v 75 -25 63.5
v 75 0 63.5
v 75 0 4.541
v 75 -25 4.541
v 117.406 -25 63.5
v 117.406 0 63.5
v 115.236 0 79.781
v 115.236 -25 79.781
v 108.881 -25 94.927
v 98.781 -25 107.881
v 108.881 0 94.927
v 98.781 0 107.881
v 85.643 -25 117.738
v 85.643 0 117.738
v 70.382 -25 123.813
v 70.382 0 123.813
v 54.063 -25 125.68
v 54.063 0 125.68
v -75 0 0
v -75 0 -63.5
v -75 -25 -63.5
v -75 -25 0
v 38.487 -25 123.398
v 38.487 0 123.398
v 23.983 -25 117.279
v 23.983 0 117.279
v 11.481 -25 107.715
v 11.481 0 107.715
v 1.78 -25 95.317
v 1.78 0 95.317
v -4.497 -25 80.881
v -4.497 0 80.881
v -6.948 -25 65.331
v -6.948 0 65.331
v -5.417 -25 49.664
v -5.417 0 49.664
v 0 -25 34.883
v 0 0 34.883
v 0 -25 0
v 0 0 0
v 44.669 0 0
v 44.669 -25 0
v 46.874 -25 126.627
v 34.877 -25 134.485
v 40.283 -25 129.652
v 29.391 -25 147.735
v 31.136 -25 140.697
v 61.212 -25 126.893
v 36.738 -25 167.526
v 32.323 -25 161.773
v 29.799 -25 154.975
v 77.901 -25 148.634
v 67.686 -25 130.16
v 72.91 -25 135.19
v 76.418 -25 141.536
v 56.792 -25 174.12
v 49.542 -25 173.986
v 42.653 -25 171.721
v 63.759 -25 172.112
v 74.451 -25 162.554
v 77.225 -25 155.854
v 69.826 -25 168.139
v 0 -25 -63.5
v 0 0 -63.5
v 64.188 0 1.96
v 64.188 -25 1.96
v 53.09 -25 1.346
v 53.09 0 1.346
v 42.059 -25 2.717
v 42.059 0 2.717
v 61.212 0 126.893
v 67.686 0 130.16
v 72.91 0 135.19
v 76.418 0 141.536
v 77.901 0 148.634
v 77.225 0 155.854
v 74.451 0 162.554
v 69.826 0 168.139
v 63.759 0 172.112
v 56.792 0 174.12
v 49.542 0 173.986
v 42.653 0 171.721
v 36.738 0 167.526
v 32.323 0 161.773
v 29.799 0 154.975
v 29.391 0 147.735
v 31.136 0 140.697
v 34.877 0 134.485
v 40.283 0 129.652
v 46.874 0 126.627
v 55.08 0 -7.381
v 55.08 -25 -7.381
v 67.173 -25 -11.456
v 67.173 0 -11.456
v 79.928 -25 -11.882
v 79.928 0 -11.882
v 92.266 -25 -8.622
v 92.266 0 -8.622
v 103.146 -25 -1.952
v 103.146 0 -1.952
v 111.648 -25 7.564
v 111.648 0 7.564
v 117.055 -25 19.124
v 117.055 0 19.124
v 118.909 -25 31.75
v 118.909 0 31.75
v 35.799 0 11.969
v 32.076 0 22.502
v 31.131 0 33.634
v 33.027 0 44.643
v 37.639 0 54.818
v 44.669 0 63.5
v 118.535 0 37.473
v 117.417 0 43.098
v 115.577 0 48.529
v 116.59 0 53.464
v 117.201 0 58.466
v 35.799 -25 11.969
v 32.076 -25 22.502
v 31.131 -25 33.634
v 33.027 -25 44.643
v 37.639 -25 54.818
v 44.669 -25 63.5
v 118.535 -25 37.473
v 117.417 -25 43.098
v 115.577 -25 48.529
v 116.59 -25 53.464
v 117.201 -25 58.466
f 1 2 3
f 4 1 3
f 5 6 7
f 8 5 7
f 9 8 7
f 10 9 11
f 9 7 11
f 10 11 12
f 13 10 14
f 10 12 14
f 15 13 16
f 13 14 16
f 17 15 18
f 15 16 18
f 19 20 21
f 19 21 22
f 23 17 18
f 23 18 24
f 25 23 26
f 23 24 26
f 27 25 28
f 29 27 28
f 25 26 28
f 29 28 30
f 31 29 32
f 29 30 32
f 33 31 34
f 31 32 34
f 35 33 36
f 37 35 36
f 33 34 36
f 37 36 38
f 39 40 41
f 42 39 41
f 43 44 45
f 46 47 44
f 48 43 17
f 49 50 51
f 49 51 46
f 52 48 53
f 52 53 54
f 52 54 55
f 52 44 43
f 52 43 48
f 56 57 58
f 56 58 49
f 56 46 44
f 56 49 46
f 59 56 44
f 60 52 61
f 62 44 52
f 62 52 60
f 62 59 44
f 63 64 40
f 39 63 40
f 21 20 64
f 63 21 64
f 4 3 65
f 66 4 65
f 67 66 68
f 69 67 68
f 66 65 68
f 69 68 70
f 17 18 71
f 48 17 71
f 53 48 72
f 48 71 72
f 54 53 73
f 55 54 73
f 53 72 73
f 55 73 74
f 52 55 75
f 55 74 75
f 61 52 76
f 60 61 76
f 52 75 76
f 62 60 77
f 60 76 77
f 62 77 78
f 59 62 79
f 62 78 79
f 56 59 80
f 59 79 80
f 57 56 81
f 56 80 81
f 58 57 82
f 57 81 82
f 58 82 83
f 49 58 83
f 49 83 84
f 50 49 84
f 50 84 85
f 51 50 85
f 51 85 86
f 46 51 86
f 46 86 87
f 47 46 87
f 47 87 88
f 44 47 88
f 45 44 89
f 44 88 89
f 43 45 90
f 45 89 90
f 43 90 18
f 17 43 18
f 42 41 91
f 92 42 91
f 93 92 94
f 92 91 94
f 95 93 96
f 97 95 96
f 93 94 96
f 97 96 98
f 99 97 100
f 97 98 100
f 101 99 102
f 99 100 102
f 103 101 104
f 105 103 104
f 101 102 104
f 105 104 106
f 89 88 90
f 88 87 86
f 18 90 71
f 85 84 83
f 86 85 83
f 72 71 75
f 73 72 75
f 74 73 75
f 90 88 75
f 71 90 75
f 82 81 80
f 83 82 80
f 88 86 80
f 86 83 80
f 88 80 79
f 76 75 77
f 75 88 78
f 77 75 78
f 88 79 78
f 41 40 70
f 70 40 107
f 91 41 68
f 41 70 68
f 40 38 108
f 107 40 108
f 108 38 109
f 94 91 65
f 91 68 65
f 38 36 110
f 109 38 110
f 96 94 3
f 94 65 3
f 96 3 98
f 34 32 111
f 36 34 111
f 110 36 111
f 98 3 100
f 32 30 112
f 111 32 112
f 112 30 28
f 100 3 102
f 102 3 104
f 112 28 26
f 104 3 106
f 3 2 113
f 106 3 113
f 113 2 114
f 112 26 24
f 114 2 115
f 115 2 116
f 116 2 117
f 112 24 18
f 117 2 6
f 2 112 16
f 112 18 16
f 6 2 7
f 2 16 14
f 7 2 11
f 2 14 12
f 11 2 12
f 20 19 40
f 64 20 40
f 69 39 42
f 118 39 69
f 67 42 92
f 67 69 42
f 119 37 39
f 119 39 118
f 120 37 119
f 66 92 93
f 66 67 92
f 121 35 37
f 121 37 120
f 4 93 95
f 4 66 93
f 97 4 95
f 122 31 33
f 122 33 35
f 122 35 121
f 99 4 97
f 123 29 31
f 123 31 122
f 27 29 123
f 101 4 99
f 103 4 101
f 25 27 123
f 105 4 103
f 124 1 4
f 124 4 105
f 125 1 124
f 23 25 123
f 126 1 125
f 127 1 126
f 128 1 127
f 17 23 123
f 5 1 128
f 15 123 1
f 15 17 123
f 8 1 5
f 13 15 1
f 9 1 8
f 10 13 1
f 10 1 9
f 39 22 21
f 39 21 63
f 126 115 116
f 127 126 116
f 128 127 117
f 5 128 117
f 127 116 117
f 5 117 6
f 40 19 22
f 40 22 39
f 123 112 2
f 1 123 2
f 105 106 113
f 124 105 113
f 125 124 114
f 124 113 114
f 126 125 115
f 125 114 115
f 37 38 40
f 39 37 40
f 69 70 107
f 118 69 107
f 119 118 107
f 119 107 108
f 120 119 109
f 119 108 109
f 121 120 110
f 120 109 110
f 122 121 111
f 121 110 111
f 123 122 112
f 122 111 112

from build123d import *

# Parameters (mm, degrees)
F1_DEPTH = 25
F0_W     = 75
F0_H     = 63.5


with BuildPart() as f1:
    # F0 (on Front) → F1 (new body)
    with BuildSketch(Plane.XZ):
        with BuildLine():
            Line((0, 34.8829194066), (0, 0))
            Line((0, 0), (44.6694262963, 0))
            ThreePointArc((44.6694262963, 0), (43.3351861339, 1.3305035541), (42.0592569414, 2.7170248176))
            ThreePointArc((42.0592569414, 2.7170248176), (17.4353764526, 14.100225033), (0, 34.8829194066))
        make_face()
        with BuildLine():
            ThreePointArc((42.0592569414, 2.7170248176), (43.3351861339, 1.3305035541), (44.6694262963, 0))
            Line((44.6694262963, 0), (75, 0))
            Line((75, 0), (75, 4.5406466367))
            ThreePointArc((75, 4.5406466367), (58.6527595412, 1.4046744939), (42.0592569414, 2.7170248176))
        make_face()
        with BuildLine():
            Line((75, 0), (44.6694262963, 0))
            ThreePointArc((44.6694262963, 0), (92.2658477308, -8.6219791852), (118.9090674143, 31.75))
            ThreePointArc((118.9090674143, 31.75), (118.0679163411, 40.3034076971), (115.5766904116, 48.5291059488))
            ThreePointArc((115.5766904116, 48.5291059488), (100.9273669379, 21.3332201623), (75, 4.5406466367))
            Line((75, 4.5406466367), (75, 0))
        make_face()
        with BuildLine():
            ThreePointArc((54.0630152571, 125.6797351802), (1.7798186625, 95.3169035326), (0, 34.8829194066))
            Line((0, 34.8829194066), (0, 63.5))
            Line((0, 63.5), (44.6694262963, 63.5))
            ThreePointArc((44.6694262963, 63.5), (84.0707025125, 74.7119431256), (115.5766904116, 48.5291059488))
            ThreePointArc((115.5766904116, 48.5291059488), (116.9466255151, 55.9589073111), (117.4055280417, 63.5))
            ThreePointArc((117.4055280417, 63.5), (98.7811445192, 107.8807204565), (54.0630152571, 125.6797351802))
        make_face()
        with BuildLine():
            Line((0, 63.5), (0, 34.8829194066))
            ThreePointArc((0, 34.8829194066), (17.4353764526, 14.100225033), (42.0592569414, 2.7170248176))
            ThreePointArc((42.0592569414, 2.7170248176), (31.1313620086, 33.6338264198), (44.6694262963, 63.5))
            Line((44.6694262963, 63.5), (0, 63.5))
        make_face()
        with BuildLine():
            Line((75, 63.5), (75, 4.5406466367))
            ThreePointArc((75, 4.5406466367), (100.9273669379, 21.3332201623), (115.5766904116, 48.5291059488))
            ThreePointArc((115.5766904116, 48.5291059488), (84.0707025125, 74.7119431256), (44.6694262963, 63.5))
            Line((44.6694262963, 63.5), (75, 63.5))
        make_face()
    extrude(amount=F1_DEPTH)


with BuildPart() as f1b:
    # F0 (on Front) → F1, piece 2 (new body)
    with BuildSketch(Plane.XZ):
        with BuildLine():
            ThreePointArc((77.9391215075, 150.0023305416), (36.2521247684, 167.0438760613), (54.0630152571, 125.6797351802))
            ThreePointArc((54.0630152571, 125.6797351802), (70.9725780667, 132.9607850219), (77.9391215075, 150.0023305416))
        make_face()
    extrude(amount=F1_DEPTH)


with BuildPart() as f1c:
    # F0 (on Front) → F1, piece 3 (new body)
    with BuildSketch(Plane.XZ):
        with Locations((-37.5, -31.75)):
            Rectangle(F0_W, F0_H)
    extrude(amount=F1_DEPTH)


solid = Compound([f1.part, f1b.part, f1c.part])
